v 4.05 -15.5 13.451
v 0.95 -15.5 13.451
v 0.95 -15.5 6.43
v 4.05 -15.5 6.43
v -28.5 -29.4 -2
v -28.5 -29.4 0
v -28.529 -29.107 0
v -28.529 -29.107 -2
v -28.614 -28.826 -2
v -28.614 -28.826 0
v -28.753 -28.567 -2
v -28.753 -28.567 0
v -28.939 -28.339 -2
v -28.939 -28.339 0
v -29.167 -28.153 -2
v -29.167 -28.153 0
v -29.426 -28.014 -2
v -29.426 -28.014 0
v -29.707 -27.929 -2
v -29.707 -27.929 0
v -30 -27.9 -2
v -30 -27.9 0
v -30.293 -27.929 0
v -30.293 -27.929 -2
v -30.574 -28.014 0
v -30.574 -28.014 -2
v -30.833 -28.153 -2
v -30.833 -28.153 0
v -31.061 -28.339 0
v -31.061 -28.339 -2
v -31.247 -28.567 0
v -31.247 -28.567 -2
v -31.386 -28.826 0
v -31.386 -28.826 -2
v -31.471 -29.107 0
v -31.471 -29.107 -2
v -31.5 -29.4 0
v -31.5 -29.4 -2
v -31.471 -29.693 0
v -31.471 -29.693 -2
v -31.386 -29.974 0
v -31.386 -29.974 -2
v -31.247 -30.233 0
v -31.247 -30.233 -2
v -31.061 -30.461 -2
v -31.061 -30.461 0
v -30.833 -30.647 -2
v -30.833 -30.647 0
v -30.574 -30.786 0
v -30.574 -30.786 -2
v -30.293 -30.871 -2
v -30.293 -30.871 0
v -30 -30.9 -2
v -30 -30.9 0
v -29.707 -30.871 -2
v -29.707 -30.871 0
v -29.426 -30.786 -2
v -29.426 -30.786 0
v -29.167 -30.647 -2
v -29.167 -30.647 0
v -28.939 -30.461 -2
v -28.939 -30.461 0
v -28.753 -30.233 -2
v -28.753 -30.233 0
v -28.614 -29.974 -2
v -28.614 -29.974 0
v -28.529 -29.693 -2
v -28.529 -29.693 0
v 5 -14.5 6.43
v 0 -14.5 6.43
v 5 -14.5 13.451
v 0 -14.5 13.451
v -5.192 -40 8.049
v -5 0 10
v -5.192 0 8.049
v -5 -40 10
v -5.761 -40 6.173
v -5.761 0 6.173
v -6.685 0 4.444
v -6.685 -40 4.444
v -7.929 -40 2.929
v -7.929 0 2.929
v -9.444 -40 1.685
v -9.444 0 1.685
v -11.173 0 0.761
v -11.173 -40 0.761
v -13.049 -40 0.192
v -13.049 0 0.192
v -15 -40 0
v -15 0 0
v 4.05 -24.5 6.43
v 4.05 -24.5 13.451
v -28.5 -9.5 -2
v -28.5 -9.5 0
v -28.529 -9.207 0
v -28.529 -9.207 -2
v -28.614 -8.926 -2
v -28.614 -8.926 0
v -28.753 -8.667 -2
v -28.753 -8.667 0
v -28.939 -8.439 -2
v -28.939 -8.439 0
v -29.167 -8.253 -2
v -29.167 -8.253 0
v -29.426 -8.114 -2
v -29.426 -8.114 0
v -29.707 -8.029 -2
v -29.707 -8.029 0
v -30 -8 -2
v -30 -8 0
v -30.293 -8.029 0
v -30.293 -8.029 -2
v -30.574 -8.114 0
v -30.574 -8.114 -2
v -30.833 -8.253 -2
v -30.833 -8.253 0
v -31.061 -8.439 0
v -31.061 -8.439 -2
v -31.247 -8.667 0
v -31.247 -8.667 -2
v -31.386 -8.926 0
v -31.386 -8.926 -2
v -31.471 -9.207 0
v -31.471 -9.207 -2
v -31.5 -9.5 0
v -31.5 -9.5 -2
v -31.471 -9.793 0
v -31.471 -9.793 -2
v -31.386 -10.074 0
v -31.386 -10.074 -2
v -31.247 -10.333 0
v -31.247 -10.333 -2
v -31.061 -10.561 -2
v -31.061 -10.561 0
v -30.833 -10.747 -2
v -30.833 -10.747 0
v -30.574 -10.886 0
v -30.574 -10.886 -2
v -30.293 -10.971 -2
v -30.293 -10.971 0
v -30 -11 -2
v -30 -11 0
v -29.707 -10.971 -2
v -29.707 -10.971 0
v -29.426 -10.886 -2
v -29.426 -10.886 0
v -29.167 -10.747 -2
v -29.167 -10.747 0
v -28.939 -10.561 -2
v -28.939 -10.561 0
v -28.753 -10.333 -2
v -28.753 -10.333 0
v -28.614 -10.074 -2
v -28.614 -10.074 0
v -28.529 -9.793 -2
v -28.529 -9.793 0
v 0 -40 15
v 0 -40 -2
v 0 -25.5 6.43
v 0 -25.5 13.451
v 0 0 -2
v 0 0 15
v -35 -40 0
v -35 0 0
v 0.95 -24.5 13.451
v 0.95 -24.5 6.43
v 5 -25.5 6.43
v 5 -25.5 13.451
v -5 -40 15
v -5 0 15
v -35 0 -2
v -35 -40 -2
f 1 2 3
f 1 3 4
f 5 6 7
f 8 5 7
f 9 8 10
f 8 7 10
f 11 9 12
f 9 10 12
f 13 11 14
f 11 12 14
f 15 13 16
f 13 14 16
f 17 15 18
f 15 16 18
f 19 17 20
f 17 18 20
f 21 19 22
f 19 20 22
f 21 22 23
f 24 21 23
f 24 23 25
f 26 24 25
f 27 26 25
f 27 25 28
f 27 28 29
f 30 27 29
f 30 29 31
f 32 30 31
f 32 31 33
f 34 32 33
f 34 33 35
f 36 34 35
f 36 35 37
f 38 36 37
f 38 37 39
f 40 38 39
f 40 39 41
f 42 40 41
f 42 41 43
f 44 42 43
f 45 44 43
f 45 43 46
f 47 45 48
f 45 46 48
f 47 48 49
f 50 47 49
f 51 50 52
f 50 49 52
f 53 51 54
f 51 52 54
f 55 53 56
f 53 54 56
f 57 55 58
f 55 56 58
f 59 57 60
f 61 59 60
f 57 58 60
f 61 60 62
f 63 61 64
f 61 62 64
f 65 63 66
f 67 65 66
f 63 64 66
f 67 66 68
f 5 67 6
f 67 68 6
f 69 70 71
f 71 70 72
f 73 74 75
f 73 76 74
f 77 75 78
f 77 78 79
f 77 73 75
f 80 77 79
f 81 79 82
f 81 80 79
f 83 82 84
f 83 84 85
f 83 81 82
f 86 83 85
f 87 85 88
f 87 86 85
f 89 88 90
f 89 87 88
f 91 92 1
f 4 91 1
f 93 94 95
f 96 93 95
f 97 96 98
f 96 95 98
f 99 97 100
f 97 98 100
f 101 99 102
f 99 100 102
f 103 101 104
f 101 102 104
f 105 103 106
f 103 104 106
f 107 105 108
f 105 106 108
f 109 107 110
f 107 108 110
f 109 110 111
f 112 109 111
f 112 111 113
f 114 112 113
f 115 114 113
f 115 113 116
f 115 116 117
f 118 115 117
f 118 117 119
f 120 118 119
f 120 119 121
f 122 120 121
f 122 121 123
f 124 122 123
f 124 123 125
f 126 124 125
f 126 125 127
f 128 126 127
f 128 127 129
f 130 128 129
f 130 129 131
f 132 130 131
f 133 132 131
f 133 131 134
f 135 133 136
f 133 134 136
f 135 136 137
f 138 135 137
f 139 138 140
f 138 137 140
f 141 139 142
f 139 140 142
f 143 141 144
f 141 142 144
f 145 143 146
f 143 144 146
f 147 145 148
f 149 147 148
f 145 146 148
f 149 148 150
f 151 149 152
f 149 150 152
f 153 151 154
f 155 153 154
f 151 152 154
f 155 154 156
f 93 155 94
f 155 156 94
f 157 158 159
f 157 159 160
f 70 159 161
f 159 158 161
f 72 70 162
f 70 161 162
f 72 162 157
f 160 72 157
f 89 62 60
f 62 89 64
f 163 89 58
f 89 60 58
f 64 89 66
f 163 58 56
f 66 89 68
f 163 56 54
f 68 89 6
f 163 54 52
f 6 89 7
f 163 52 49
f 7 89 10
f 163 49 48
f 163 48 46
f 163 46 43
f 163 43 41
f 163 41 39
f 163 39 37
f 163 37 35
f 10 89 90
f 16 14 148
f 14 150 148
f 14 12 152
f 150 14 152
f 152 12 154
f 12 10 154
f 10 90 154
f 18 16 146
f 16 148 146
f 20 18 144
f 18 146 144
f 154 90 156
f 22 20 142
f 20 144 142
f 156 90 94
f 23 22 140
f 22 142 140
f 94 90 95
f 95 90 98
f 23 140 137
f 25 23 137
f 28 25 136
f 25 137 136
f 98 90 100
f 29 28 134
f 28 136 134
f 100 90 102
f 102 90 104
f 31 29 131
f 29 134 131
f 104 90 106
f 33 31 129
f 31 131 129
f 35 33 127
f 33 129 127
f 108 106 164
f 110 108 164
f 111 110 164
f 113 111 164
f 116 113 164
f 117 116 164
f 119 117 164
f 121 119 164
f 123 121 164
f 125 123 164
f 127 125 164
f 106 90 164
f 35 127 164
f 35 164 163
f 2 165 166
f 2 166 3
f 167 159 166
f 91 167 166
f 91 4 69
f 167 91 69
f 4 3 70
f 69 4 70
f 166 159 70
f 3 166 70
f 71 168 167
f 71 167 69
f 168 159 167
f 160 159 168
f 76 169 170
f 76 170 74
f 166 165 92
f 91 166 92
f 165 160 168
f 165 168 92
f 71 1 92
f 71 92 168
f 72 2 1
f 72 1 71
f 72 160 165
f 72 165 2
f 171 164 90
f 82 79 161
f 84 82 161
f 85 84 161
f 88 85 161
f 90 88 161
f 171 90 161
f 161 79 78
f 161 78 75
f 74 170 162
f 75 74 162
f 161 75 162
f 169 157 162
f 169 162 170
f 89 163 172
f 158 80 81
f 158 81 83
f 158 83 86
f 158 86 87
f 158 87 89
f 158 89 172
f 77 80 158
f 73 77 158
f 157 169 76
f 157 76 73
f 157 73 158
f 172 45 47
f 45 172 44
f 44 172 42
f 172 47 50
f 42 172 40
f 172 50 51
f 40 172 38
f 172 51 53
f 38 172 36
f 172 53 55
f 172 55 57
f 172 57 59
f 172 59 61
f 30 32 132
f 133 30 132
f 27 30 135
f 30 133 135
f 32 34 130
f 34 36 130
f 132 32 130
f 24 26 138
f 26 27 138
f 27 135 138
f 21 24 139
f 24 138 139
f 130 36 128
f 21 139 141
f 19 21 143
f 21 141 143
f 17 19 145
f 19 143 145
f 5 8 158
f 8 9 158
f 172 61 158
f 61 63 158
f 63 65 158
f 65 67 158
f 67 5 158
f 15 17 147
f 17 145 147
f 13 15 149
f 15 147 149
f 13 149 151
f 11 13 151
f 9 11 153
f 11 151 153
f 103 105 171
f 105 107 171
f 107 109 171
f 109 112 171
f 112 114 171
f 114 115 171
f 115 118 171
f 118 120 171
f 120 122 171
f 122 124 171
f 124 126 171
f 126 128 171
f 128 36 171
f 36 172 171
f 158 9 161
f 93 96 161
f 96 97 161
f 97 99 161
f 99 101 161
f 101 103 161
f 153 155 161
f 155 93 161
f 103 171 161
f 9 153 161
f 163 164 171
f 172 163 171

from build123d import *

# Parameters (mm, degrees)
F1_DEPTH = 40
F2_R     = 10
F3_R     = 1.5
F4_DEPTH = 6
F5_W     = 11
F5_H     = 7.0209084079
F6_DEPTH = 5
F7_W     = 3.1
F7_H     = 9
F8_DEPTH = 25


with BuildPart() as f1:
    # F0 (on Front) → F1 (new body)
    with BuildSketch(Plane.XZ):
        Polygon((-5, 15), (-5, 0), (-35, 0), (-35, -2), (-5, -2), (0, -2), (0, 0), (0, 15), align=None)
    extrude(amount=F1_DEPTH)

    # F2
    f2_edges = [f1.edges().sort_by_distance(p)[0] for p in [
        (-5, -20, 0),
    ]]
    fillet(f2_edges, radius=F2_R)

    # F3 (on face) → F4 (cut)
    with BuildSketch(Plane.XY):
        with Locations((-30, -9.5)):
            Circle(F3_R)
        with Locations((-30, -29.4)):
            Circle(F3_R)
    extrude(amount=-F4_DEPTH, mode=Mode.SUBTRACT)

    # F5 (on face) → F6 (join)
    with BuildSketch(Plane.YZ):
        with Locations((-20, 9.9406884983)):
            Rectangle(F5_W, F5_H)
    extrude(amount=F6_DEPTH)

    # F7 (on face) → F8 (cut)
    with BuildSketch(Plane.XY.offset(13.4511427023)):
        with Locations((2.5, -20)):
            Rectangle(F7_W, F7_H)
    extrude(amount=-F8_DEPTH, mode=Mode.SUBTRACT)


solid = f1.part
